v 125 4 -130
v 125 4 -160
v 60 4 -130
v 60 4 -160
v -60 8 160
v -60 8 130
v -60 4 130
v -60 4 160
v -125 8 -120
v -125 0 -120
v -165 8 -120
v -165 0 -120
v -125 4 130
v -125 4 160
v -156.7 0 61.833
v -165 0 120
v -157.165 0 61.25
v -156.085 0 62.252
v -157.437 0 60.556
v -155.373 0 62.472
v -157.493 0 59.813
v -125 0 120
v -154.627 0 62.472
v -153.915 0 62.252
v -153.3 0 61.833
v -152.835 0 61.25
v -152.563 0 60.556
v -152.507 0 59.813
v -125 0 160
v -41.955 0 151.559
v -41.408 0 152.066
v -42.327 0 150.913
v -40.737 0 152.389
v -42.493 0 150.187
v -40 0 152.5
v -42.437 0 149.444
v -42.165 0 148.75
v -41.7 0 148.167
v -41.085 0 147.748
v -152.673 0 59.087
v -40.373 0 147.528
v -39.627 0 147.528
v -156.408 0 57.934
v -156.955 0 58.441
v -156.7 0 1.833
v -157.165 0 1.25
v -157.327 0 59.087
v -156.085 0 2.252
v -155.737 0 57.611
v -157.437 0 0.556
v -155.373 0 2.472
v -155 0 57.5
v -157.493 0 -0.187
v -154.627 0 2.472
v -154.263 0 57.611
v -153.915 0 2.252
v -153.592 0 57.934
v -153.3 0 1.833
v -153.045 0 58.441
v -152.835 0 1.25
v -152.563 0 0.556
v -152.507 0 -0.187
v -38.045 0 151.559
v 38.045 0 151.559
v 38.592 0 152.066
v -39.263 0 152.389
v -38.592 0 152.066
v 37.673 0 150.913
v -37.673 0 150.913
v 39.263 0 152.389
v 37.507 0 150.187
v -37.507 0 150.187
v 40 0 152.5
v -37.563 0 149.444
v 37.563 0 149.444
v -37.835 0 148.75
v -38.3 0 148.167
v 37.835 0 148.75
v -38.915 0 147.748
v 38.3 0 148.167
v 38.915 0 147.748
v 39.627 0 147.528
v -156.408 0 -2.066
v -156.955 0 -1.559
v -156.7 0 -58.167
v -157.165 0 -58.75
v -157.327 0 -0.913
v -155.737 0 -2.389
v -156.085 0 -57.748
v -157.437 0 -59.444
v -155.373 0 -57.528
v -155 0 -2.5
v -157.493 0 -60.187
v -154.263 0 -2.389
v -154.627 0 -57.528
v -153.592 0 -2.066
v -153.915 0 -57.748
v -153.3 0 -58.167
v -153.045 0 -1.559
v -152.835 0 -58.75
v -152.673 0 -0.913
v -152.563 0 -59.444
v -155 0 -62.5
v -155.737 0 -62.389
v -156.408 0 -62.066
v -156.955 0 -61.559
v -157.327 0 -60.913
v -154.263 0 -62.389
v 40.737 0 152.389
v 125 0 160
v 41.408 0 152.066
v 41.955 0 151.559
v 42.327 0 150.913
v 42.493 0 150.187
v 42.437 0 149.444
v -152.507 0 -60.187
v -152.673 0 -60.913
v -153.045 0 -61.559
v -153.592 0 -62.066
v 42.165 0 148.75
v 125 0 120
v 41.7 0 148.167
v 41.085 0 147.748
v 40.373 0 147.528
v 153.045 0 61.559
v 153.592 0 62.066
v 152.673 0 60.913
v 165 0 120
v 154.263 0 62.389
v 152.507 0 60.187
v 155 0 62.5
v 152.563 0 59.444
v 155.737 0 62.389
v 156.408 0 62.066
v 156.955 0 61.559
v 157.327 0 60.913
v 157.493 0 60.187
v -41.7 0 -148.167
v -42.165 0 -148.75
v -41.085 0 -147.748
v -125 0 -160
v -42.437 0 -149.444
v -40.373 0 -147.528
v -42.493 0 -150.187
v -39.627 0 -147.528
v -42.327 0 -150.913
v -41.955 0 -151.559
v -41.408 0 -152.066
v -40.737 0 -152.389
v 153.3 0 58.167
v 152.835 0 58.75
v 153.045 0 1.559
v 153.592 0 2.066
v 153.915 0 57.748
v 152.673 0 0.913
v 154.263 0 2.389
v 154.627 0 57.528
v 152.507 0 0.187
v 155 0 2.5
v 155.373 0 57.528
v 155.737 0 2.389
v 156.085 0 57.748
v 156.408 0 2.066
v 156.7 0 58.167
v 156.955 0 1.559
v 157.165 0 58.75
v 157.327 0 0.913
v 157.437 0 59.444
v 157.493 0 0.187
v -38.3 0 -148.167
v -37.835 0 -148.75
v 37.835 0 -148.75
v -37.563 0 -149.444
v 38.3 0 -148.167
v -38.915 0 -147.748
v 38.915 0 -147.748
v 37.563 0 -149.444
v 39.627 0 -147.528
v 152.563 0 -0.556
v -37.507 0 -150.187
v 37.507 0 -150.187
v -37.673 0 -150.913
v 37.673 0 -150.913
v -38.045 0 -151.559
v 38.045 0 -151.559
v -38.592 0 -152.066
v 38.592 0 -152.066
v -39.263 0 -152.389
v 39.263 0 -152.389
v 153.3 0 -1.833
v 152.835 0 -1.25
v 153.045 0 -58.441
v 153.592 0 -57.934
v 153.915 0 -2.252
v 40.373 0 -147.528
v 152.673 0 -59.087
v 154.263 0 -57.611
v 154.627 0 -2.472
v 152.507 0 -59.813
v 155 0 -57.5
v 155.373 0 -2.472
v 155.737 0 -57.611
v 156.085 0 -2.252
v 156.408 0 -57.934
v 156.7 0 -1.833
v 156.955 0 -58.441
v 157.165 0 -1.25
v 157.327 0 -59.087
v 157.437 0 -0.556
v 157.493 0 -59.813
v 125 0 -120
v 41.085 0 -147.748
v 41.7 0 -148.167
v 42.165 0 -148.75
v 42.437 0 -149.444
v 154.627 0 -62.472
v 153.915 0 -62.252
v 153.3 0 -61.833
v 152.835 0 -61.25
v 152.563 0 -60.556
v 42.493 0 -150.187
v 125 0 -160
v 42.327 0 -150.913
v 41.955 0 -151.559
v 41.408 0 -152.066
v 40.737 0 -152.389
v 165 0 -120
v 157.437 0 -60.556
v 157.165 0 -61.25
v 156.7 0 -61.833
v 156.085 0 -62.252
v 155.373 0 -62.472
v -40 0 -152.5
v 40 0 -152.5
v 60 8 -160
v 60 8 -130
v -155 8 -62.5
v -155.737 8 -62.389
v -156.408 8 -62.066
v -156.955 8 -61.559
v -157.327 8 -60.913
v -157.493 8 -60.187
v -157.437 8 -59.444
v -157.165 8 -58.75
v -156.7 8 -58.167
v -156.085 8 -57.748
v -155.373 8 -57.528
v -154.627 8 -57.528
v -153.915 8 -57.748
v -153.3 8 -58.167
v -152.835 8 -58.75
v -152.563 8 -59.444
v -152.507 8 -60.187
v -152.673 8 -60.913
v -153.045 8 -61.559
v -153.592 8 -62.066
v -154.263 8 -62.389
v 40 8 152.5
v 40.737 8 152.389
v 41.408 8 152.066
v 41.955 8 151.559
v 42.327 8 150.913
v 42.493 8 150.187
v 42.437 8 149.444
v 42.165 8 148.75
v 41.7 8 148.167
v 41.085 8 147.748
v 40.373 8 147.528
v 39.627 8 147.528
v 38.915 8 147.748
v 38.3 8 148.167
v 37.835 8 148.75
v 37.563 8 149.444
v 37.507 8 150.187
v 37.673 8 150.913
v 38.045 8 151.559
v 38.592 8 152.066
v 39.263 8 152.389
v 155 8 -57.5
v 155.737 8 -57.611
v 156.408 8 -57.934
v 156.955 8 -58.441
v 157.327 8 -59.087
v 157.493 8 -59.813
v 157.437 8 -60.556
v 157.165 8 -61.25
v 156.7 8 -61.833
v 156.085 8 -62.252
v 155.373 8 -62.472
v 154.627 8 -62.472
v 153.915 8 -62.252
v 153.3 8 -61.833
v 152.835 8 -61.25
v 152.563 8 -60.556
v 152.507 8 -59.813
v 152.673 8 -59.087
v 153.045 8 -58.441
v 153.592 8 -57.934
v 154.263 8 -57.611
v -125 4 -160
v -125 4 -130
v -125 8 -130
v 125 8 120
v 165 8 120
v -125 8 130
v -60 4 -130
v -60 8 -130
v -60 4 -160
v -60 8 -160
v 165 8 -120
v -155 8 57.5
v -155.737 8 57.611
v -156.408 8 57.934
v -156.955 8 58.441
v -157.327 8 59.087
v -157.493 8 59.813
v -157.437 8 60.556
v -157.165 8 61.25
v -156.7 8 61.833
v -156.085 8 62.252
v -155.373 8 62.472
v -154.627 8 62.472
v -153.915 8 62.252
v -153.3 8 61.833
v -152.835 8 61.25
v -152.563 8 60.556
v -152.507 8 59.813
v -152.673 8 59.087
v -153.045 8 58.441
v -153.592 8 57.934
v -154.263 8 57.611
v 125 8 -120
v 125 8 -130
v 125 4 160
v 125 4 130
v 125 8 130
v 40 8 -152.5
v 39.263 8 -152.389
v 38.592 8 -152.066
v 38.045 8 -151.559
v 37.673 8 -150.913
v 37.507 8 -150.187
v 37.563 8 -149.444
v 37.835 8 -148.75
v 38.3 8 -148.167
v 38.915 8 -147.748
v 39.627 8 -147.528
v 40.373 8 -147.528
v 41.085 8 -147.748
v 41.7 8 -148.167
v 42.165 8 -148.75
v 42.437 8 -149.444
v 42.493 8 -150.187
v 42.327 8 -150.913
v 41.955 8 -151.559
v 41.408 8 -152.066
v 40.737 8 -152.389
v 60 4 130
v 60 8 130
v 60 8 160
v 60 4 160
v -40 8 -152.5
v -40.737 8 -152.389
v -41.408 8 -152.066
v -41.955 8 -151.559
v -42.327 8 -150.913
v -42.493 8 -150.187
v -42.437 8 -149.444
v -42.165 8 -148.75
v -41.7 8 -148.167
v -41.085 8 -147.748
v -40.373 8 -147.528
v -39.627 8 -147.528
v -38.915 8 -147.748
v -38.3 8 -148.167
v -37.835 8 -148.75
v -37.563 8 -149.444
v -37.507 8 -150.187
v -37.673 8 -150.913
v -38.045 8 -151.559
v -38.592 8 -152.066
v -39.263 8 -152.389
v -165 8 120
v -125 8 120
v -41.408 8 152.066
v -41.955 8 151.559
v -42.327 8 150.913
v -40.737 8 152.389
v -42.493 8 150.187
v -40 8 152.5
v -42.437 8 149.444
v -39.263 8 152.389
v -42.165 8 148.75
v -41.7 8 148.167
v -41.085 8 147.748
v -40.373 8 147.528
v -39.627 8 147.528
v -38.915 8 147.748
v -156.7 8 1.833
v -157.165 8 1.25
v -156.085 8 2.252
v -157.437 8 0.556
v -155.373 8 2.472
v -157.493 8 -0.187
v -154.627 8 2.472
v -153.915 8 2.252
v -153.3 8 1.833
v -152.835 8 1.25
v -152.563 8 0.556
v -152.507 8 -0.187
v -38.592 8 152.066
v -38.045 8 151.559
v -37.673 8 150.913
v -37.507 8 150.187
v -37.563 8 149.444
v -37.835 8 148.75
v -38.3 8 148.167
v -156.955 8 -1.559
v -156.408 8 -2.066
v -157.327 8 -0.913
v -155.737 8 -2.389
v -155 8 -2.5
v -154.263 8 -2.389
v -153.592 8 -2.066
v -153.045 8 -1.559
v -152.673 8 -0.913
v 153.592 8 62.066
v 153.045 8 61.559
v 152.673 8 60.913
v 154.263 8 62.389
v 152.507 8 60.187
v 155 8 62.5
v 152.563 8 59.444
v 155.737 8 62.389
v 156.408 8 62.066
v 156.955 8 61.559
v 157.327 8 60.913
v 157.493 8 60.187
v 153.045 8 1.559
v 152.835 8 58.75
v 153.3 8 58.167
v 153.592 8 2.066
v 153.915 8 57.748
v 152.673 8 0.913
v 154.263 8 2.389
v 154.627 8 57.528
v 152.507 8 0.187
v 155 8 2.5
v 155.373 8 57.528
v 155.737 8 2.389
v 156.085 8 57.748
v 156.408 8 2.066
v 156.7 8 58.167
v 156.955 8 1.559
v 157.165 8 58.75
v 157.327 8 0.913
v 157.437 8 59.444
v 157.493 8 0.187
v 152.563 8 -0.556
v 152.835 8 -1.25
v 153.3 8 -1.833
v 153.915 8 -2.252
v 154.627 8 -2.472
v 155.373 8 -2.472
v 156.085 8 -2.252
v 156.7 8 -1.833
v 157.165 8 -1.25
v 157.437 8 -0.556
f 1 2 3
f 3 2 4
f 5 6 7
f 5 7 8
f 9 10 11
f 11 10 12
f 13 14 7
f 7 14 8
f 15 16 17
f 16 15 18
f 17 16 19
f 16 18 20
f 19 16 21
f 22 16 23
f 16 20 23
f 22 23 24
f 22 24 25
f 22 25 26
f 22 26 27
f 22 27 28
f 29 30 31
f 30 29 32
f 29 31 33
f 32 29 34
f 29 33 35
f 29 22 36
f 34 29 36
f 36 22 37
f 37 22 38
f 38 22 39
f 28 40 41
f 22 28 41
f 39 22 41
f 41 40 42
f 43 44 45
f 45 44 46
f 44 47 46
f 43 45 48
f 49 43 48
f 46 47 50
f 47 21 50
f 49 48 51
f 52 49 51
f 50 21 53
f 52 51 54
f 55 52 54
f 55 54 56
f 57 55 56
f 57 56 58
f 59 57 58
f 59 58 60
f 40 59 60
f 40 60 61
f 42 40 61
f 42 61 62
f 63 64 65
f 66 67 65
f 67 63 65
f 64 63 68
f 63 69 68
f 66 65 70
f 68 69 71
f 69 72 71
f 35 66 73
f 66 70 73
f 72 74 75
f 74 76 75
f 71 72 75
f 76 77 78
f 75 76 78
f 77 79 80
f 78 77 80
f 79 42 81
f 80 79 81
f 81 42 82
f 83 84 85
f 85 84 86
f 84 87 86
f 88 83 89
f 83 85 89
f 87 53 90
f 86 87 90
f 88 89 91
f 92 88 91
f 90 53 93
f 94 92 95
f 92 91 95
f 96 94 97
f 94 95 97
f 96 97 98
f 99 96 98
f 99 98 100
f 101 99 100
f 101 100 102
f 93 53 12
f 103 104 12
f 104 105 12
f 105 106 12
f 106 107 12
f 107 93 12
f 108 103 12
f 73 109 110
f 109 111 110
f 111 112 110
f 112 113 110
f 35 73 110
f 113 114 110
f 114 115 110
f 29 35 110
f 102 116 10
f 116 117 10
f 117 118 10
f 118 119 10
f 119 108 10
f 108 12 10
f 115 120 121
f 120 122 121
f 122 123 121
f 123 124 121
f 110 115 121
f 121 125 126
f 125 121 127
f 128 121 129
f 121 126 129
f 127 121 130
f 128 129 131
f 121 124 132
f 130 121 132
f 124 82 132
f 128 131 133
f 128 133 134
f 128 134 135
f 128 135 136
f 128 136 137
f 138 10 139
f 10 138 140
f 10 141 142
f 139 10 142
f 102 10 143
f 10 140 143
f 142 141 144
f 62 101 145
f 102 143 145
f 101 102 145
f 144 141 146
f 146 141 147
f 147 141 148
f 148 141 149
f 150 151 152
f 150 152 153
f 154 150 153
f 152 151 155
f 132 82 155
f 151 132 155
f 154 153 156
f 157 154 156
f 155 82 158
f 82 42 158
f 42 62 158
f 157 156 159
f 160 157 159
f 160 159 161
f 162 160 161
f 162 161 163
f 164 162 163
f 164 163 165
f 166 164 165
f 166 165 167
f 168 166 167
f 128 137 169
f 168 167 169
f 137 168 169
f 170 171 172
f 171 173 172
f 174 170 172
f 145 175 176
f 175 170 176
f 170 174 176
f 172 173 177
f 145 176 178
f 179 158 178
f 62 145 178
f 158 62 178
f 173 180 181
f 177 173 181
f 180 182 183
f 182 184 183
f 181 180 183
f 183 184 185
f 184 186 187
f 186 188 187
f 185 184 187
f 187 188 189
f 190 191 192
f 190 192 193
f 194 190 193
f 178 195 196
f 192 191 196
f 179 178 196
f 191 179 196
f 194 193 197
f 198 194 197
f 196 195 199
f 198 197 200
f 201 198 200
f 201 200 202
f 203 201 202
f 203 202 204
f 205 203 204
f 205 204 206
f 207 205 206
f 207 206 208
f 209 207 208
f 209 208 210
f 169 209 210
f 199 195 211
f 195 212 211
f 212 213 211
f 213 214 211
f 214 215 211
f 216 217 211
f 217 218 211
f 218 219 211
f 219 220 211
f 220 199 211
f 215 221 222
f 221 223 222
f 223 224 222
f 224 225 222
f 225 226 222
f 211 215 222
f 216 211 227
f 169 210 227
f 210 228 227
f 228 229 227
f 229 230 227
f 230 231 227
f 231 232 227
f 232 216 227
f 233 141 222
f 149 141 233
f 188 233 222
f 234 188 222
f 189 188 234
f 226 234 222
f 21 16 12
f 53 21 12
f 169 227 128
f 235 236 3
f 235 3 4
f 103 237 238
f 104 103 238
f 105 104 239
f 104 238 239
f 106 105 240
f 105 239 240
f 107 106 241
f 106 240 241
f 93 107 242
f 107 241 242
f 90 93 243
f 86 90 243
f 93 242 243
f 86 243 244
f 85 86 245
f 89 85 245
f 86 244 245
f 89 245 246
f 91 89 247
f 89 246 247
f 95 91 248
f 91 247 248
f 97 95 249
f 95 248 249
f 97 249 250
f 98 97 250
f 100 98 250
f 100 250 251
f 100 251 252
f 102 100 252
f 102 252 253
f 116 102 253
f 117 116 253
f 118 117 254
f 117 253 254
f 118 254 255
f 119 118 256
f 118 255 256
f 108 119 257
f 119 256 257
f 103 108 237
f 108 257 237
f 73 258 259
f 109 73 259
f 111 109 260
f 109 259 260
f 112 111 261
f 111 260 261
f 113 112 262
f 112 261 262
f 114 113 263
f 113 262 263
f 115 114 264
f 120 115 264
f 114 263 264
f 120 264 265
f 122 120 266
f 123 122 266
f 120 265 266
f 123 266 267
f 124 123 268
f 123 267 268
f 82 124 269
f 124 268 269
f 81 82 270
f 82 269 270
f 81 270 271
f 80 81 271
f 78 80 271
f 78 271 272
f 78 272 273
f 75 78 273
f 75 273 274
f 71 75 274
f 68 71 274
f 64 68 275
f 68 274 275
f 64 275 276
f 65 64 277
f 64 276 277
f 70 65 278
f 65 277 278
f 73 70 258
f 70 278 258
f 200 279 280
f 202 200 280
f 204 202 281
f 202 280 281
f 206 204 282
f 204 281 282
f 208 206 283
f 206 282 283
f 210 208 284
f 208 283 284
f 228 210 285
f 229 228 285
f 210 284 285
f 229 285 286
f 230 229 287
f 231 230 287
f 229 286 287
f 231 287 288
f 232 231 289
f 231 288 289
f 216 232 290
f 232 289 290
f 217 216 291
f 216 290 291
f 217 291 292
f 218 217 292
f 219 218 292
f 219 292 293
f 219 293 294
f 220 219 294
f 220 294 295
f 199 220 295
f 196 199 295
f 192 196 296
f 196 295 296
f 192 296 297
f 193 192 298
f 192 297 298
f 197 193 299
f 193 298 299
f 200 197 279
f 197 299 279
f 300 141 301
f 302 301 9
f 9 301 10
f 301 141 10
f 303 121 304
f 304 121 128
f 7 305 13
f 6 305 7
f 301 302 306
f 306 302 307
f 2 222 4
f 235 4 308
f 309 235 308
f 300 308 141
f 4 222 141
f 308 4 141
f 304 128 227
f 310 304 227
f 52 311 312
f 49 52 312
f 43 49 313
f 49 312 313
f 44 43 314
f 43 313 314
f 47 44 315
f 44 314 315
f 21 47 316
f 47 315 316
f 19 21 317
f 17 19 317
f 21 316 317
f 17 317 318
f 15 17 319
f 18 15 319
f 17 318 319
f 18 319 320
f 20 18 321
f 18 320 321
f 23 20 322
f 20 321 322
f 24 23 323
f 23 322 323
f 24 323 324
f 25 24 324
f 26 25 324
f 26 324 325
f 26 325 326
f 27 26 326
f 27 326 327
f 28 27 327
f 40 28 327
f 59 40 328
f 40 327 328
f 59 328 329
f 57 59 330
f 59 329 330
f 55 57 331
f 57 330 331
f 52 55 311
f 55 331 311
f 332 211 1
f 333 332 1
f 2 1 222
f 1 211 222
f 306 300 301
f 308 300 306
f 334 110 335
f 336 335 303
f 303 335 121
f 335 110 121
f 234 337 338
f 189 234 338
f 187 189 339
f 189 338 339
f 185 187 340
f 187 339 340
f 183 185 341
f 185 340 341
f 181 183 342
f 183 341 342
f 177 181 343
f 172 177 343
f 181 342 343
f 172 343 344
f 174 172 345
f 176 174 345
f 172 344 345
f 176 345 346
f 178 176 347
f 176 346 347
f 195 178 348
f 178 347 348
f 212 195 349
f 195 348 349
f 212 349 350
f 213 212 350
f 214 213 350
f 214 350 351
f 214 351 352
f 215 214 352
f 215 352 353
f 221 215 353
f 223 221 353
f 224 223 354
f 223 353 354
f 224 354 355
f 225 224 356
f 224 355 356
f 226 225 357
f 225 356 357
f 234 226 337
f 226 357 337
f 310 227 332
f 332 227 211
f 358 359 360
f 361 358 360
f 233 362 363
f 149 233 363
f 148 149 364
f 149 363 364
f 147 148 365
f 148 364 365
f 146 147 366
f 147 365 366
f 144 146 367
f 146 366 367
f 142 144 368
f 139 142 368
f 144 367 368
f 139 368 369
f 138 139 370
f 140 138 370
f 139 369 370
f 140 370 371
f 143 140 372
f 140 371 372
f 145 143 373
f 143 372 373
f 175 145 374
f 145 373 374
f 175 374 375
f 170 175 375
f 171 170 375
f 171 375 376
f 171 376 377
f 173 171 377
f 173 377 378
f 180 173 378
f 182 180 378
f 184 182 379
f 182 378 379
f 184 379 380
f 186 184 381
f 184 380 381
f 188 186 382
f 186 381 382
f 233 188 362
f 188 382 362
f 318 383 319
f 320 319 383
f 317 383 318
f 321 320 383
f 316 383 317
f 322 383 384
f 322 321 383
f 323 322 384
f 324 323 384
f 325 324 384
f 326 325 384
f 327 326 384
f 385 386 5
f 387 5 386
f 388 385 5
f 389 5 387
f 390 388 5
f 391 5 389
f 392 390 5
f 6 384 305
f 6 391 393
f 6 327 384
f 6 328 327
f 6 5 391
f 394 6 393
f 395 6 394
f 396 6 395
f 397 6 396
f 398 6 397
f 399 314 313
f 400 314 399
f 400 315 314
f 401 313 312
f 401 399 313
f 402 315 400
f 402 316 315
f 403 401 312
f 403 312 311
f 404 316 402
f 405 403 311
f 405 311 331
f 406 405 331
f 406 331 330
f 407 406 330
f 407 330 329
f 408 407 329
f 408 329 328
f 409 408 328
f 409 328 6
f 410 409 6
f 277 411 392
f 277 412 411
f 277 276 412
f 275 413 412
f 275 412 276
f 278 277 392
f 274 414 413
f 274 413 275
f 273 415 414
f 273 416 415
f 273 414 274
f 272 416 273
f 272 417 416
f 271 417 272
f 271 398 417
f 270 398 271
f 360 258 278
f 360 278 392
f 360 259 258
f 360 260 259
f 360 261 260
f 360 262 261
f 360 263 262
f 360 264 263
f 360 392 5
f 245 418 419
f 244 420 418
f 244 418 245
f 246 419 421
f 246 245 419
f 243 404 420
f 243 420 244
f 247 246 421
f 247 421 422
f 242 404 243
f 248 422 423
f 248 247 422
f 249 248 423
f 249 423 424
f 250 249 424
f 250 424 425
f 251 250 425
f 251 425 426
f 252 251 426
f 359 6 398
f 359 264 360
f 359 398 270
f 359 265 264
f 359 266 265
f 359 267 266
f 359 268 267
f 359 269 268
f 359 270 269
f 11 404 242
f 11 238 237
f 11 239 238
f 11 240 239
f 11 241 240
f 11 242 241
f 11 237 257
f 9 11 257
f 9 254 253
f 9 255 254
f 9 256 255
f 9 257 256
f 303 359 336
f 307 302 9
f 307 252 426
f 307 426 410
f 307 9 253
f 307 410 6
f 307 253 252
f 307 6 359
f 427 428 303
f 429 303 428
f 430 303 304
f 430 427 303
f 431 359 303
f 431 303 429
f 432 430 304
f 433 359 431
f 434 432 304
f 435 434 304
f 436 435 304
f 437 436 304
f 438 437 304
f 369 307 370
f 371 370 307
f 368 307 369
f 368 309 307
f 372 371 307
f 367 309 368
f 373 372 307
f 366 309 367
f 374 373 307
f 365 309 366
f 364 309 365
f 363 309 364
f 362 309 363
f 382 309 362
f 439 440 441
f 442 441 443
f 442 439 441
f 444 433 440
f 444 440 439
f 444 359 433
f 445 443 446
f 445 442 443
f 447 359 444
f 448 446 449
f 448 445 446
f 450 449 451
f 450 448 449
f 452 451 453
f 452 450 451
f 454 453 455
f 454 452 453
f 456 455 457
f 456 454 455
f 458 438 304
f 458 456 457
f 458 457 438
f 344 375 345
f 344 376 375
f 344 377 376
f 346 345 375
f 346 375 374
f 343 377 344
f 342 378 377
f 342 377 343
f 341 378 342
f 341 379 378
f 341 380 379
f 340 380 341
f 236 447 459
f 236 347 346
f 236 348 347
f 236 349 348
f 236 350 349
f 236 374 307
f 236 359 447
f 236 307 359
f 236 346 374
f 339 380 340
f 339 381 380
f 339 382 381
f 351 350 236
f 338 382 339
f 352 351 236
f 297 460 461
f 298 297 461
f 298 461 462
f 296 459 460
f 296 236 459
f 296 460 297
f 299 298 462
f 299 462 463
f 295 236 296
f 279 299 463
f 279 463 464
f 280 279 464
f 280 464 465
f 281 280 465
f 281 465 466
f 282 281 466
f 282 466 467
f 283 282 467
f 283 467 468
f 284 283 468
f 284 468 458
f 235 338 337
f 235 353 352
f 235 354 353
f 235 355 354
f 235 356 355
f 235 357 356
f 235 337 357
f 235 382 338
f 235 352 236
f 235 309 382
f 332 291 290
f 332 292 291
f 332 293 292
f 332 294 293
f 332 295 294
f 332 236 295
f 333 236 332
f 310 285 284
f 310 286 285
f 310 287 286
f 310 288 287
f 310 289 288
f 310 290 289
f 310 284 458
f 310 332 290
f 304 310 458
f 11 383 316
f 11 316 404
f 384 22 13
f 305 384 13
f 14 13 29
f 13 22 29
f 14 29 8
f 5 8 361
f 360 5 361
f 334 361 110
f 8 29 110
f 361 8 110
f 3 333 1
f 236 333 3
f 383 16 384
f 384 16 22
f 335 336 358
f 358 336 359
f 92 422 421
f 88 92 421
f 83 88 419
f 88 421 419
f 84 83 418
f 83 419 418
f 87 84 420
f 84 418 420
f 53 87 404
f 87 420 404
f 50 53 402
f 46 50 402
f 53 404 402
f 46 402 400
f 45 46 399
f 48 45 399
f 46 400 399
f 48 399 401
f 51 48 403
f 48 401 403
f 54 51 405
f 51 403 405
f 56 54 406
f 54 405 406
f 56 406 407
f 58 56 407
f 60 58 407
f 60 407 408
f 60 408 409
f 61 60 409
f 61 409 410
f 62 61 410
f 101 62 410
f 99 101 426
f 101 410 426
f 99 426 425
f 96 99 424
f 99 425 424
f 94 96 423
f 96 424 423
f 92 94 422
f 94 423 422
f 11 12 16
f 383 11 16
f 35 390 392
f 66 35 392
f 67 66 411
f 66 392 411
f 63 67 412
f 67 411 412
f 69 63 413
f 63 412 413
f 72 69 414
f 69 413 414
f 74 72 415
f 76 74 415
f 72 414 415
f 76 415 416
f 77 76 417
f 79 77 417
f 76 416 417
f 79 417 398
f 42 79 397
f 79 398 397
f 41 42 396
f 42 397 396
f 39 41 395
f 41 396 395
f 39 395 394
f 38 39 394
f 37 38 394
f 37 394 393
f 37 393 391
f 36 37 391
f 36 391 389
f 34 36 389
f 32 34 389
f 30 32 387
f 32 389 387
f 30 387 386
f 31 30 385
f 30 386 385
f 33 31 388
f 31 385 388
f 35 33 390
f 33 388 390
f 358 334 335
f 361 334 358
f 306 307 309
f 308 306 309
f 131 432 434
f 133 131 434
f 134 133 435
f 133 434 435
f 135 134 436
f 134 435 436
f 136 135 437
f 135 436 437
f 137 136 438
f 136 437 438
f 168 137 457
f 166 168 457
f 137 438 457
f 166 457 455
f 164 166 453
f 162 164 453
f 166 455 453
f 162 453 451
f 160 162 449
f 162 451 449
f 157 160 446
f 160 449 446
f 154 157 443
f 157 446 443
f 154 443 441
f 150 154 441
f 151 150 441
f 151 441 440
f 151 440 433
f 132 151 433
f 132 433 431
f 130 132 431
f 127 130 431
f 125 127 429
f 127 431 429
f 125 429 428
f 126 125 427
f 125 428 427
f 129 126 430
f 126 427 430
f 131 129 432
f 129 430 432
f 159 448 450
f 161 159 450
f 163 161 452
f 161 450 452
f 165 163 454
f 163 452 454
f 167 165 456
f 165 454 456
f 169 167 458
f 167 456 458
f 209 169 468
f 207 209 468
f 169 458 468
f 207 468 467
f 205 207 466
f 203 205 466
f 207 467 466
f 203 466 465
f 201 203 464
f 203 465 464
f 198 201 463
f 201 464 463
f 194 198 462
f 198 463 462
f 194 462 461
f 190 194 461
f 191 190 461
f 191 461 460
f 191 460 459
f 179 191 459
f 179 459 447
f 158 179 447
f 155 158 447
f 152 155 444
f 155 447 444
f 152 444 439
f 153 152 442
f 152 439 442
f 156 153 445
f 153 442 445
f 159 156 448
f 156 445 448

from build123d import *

# Parameters (mm, degrees)
BOSS_EXTRUDE1_DEPTH     = 8
SKETCH2_R               = 2.5
CUT_EXTRUDE1_DEPTH      = 8
SKETCH3_W               = 65
SKETCH3_H               = 30
CUT_EXTRUDE2_DEPTH      = 4
MIRROR2_COPY_1_SKETCH_W = 65
MIRROR2_COPY_1_SKETCH_H = 30
MIRROR2_COPY_1_DEPTH    = 4


with BuildPart() as part:
    # Sketch1 → Boss-Extrude1 (new body)
    with BuildSketch(Plane(origin=(0, 0, 0), x_dir=(1, 0, 0), z_dir=(0, 1, 0))):
        Polygon((125, 160), (-125, 160), (-125, 120), (-165, 120), (-165, -120), (-125, -120), (-125, -160), (125, -160), (125, -120), (165, -120), (165, 120), (125, 120), align=None)
    extrude(amount=BOSS_EXTRUDE1_DEPTH)

    # Sketch2 → Cut-Extrude1 (cut)
    with BuildSketch(Plane(origin=(0, 8, 0), x_dir=(1, 0, 0), z_dir=(0, 1, 0))):
        with Locations(Location((155, 60, 0), (0, 0, 270))):
            Circle(SKETCH2_R)
        with Locations(Location((155, 0, 0), (0, 0, 270))):
            Circle(SKETCH2_R)
        with Locations(Location((155, -60, 0), (0, 0, 270))):
            Circle(SKETCH2_R)
        with Locations(Location((40, -150, 0), (0, 0, 270))):
            Circle(SKETCH2_R)
        with Locations(Location((-40, -150, 0), (0, 0, 270))):
            Circle(SKETCH2_R)
        with Locations(Location((-155, -60, 0), (0, 0, 90))):
            Circle(SKETCH2_R)
        with Locations(Location((-155, 0, 0), (0, 0, 90))):
            Circle(SKETCH2_R)
        with Locations(Location((-155, 60, 0), (0, 0, 90))):
            Circle(SKETCH2_R)
        with Locations(Location((-40, 150, 0), (0, 0, 90))):
            Circle(SKETCH2_R)
        with Locations(Location((40, 150, 0), (0, 0, 90))):
            Circle(SKETCH2_R)
    extrude(amount=-CUT_EXTRUDE1_DEPTH, mode=Mode.SUBTRACT)

    # Sketch3 → Cut-Extrude2 (cut)
    with BuildSketch(Plane(origin=(0, 8, 0), x_dir=(1, 0, 0), z_dir=(0, 1, 0))):
        with Locations((-92.5, 145)):
            Rectangle(SKETCH3_W, SKETCH3_H)
    cut_extrude2 = extrude(amount=-CUT_EXTRUDE2_DEPTH, mode=Mode.SUBTRACT)

    # Mirror1: Cut-Extrude2 across plane
    add(cut_extrude2.mirror(Plane(origin=(0, 0, 0), x_dir=(1, 0, 0), z_dir=(0, 0, -1))), mode=Mode.SUBTRACT)

    # Mirror2: Cut-Extrude2 across plane
    add(cut_extrude2.mirror(Plane.ZY), mode=Mode.SUBTRACT)

    # Mirror2 copy 1 sketch → Mirror2 copy 1 (cut)
    with BuildSketch(Plane(origin=(0, 8, 0), x_dir=(-1, 0, 0), z_dir=(0, 1, 0))):
        with Locations((-92.5, 145)):
            Rectangle(MIRROR2_COPY_1_SKETCH_W, MIRROR2_COPY_1_SKETCH_H)
    extrude(amount=-MIRROR2_COPY_1_DEPTH, mode=Mode.SUBTRACT)


solid = part.part
